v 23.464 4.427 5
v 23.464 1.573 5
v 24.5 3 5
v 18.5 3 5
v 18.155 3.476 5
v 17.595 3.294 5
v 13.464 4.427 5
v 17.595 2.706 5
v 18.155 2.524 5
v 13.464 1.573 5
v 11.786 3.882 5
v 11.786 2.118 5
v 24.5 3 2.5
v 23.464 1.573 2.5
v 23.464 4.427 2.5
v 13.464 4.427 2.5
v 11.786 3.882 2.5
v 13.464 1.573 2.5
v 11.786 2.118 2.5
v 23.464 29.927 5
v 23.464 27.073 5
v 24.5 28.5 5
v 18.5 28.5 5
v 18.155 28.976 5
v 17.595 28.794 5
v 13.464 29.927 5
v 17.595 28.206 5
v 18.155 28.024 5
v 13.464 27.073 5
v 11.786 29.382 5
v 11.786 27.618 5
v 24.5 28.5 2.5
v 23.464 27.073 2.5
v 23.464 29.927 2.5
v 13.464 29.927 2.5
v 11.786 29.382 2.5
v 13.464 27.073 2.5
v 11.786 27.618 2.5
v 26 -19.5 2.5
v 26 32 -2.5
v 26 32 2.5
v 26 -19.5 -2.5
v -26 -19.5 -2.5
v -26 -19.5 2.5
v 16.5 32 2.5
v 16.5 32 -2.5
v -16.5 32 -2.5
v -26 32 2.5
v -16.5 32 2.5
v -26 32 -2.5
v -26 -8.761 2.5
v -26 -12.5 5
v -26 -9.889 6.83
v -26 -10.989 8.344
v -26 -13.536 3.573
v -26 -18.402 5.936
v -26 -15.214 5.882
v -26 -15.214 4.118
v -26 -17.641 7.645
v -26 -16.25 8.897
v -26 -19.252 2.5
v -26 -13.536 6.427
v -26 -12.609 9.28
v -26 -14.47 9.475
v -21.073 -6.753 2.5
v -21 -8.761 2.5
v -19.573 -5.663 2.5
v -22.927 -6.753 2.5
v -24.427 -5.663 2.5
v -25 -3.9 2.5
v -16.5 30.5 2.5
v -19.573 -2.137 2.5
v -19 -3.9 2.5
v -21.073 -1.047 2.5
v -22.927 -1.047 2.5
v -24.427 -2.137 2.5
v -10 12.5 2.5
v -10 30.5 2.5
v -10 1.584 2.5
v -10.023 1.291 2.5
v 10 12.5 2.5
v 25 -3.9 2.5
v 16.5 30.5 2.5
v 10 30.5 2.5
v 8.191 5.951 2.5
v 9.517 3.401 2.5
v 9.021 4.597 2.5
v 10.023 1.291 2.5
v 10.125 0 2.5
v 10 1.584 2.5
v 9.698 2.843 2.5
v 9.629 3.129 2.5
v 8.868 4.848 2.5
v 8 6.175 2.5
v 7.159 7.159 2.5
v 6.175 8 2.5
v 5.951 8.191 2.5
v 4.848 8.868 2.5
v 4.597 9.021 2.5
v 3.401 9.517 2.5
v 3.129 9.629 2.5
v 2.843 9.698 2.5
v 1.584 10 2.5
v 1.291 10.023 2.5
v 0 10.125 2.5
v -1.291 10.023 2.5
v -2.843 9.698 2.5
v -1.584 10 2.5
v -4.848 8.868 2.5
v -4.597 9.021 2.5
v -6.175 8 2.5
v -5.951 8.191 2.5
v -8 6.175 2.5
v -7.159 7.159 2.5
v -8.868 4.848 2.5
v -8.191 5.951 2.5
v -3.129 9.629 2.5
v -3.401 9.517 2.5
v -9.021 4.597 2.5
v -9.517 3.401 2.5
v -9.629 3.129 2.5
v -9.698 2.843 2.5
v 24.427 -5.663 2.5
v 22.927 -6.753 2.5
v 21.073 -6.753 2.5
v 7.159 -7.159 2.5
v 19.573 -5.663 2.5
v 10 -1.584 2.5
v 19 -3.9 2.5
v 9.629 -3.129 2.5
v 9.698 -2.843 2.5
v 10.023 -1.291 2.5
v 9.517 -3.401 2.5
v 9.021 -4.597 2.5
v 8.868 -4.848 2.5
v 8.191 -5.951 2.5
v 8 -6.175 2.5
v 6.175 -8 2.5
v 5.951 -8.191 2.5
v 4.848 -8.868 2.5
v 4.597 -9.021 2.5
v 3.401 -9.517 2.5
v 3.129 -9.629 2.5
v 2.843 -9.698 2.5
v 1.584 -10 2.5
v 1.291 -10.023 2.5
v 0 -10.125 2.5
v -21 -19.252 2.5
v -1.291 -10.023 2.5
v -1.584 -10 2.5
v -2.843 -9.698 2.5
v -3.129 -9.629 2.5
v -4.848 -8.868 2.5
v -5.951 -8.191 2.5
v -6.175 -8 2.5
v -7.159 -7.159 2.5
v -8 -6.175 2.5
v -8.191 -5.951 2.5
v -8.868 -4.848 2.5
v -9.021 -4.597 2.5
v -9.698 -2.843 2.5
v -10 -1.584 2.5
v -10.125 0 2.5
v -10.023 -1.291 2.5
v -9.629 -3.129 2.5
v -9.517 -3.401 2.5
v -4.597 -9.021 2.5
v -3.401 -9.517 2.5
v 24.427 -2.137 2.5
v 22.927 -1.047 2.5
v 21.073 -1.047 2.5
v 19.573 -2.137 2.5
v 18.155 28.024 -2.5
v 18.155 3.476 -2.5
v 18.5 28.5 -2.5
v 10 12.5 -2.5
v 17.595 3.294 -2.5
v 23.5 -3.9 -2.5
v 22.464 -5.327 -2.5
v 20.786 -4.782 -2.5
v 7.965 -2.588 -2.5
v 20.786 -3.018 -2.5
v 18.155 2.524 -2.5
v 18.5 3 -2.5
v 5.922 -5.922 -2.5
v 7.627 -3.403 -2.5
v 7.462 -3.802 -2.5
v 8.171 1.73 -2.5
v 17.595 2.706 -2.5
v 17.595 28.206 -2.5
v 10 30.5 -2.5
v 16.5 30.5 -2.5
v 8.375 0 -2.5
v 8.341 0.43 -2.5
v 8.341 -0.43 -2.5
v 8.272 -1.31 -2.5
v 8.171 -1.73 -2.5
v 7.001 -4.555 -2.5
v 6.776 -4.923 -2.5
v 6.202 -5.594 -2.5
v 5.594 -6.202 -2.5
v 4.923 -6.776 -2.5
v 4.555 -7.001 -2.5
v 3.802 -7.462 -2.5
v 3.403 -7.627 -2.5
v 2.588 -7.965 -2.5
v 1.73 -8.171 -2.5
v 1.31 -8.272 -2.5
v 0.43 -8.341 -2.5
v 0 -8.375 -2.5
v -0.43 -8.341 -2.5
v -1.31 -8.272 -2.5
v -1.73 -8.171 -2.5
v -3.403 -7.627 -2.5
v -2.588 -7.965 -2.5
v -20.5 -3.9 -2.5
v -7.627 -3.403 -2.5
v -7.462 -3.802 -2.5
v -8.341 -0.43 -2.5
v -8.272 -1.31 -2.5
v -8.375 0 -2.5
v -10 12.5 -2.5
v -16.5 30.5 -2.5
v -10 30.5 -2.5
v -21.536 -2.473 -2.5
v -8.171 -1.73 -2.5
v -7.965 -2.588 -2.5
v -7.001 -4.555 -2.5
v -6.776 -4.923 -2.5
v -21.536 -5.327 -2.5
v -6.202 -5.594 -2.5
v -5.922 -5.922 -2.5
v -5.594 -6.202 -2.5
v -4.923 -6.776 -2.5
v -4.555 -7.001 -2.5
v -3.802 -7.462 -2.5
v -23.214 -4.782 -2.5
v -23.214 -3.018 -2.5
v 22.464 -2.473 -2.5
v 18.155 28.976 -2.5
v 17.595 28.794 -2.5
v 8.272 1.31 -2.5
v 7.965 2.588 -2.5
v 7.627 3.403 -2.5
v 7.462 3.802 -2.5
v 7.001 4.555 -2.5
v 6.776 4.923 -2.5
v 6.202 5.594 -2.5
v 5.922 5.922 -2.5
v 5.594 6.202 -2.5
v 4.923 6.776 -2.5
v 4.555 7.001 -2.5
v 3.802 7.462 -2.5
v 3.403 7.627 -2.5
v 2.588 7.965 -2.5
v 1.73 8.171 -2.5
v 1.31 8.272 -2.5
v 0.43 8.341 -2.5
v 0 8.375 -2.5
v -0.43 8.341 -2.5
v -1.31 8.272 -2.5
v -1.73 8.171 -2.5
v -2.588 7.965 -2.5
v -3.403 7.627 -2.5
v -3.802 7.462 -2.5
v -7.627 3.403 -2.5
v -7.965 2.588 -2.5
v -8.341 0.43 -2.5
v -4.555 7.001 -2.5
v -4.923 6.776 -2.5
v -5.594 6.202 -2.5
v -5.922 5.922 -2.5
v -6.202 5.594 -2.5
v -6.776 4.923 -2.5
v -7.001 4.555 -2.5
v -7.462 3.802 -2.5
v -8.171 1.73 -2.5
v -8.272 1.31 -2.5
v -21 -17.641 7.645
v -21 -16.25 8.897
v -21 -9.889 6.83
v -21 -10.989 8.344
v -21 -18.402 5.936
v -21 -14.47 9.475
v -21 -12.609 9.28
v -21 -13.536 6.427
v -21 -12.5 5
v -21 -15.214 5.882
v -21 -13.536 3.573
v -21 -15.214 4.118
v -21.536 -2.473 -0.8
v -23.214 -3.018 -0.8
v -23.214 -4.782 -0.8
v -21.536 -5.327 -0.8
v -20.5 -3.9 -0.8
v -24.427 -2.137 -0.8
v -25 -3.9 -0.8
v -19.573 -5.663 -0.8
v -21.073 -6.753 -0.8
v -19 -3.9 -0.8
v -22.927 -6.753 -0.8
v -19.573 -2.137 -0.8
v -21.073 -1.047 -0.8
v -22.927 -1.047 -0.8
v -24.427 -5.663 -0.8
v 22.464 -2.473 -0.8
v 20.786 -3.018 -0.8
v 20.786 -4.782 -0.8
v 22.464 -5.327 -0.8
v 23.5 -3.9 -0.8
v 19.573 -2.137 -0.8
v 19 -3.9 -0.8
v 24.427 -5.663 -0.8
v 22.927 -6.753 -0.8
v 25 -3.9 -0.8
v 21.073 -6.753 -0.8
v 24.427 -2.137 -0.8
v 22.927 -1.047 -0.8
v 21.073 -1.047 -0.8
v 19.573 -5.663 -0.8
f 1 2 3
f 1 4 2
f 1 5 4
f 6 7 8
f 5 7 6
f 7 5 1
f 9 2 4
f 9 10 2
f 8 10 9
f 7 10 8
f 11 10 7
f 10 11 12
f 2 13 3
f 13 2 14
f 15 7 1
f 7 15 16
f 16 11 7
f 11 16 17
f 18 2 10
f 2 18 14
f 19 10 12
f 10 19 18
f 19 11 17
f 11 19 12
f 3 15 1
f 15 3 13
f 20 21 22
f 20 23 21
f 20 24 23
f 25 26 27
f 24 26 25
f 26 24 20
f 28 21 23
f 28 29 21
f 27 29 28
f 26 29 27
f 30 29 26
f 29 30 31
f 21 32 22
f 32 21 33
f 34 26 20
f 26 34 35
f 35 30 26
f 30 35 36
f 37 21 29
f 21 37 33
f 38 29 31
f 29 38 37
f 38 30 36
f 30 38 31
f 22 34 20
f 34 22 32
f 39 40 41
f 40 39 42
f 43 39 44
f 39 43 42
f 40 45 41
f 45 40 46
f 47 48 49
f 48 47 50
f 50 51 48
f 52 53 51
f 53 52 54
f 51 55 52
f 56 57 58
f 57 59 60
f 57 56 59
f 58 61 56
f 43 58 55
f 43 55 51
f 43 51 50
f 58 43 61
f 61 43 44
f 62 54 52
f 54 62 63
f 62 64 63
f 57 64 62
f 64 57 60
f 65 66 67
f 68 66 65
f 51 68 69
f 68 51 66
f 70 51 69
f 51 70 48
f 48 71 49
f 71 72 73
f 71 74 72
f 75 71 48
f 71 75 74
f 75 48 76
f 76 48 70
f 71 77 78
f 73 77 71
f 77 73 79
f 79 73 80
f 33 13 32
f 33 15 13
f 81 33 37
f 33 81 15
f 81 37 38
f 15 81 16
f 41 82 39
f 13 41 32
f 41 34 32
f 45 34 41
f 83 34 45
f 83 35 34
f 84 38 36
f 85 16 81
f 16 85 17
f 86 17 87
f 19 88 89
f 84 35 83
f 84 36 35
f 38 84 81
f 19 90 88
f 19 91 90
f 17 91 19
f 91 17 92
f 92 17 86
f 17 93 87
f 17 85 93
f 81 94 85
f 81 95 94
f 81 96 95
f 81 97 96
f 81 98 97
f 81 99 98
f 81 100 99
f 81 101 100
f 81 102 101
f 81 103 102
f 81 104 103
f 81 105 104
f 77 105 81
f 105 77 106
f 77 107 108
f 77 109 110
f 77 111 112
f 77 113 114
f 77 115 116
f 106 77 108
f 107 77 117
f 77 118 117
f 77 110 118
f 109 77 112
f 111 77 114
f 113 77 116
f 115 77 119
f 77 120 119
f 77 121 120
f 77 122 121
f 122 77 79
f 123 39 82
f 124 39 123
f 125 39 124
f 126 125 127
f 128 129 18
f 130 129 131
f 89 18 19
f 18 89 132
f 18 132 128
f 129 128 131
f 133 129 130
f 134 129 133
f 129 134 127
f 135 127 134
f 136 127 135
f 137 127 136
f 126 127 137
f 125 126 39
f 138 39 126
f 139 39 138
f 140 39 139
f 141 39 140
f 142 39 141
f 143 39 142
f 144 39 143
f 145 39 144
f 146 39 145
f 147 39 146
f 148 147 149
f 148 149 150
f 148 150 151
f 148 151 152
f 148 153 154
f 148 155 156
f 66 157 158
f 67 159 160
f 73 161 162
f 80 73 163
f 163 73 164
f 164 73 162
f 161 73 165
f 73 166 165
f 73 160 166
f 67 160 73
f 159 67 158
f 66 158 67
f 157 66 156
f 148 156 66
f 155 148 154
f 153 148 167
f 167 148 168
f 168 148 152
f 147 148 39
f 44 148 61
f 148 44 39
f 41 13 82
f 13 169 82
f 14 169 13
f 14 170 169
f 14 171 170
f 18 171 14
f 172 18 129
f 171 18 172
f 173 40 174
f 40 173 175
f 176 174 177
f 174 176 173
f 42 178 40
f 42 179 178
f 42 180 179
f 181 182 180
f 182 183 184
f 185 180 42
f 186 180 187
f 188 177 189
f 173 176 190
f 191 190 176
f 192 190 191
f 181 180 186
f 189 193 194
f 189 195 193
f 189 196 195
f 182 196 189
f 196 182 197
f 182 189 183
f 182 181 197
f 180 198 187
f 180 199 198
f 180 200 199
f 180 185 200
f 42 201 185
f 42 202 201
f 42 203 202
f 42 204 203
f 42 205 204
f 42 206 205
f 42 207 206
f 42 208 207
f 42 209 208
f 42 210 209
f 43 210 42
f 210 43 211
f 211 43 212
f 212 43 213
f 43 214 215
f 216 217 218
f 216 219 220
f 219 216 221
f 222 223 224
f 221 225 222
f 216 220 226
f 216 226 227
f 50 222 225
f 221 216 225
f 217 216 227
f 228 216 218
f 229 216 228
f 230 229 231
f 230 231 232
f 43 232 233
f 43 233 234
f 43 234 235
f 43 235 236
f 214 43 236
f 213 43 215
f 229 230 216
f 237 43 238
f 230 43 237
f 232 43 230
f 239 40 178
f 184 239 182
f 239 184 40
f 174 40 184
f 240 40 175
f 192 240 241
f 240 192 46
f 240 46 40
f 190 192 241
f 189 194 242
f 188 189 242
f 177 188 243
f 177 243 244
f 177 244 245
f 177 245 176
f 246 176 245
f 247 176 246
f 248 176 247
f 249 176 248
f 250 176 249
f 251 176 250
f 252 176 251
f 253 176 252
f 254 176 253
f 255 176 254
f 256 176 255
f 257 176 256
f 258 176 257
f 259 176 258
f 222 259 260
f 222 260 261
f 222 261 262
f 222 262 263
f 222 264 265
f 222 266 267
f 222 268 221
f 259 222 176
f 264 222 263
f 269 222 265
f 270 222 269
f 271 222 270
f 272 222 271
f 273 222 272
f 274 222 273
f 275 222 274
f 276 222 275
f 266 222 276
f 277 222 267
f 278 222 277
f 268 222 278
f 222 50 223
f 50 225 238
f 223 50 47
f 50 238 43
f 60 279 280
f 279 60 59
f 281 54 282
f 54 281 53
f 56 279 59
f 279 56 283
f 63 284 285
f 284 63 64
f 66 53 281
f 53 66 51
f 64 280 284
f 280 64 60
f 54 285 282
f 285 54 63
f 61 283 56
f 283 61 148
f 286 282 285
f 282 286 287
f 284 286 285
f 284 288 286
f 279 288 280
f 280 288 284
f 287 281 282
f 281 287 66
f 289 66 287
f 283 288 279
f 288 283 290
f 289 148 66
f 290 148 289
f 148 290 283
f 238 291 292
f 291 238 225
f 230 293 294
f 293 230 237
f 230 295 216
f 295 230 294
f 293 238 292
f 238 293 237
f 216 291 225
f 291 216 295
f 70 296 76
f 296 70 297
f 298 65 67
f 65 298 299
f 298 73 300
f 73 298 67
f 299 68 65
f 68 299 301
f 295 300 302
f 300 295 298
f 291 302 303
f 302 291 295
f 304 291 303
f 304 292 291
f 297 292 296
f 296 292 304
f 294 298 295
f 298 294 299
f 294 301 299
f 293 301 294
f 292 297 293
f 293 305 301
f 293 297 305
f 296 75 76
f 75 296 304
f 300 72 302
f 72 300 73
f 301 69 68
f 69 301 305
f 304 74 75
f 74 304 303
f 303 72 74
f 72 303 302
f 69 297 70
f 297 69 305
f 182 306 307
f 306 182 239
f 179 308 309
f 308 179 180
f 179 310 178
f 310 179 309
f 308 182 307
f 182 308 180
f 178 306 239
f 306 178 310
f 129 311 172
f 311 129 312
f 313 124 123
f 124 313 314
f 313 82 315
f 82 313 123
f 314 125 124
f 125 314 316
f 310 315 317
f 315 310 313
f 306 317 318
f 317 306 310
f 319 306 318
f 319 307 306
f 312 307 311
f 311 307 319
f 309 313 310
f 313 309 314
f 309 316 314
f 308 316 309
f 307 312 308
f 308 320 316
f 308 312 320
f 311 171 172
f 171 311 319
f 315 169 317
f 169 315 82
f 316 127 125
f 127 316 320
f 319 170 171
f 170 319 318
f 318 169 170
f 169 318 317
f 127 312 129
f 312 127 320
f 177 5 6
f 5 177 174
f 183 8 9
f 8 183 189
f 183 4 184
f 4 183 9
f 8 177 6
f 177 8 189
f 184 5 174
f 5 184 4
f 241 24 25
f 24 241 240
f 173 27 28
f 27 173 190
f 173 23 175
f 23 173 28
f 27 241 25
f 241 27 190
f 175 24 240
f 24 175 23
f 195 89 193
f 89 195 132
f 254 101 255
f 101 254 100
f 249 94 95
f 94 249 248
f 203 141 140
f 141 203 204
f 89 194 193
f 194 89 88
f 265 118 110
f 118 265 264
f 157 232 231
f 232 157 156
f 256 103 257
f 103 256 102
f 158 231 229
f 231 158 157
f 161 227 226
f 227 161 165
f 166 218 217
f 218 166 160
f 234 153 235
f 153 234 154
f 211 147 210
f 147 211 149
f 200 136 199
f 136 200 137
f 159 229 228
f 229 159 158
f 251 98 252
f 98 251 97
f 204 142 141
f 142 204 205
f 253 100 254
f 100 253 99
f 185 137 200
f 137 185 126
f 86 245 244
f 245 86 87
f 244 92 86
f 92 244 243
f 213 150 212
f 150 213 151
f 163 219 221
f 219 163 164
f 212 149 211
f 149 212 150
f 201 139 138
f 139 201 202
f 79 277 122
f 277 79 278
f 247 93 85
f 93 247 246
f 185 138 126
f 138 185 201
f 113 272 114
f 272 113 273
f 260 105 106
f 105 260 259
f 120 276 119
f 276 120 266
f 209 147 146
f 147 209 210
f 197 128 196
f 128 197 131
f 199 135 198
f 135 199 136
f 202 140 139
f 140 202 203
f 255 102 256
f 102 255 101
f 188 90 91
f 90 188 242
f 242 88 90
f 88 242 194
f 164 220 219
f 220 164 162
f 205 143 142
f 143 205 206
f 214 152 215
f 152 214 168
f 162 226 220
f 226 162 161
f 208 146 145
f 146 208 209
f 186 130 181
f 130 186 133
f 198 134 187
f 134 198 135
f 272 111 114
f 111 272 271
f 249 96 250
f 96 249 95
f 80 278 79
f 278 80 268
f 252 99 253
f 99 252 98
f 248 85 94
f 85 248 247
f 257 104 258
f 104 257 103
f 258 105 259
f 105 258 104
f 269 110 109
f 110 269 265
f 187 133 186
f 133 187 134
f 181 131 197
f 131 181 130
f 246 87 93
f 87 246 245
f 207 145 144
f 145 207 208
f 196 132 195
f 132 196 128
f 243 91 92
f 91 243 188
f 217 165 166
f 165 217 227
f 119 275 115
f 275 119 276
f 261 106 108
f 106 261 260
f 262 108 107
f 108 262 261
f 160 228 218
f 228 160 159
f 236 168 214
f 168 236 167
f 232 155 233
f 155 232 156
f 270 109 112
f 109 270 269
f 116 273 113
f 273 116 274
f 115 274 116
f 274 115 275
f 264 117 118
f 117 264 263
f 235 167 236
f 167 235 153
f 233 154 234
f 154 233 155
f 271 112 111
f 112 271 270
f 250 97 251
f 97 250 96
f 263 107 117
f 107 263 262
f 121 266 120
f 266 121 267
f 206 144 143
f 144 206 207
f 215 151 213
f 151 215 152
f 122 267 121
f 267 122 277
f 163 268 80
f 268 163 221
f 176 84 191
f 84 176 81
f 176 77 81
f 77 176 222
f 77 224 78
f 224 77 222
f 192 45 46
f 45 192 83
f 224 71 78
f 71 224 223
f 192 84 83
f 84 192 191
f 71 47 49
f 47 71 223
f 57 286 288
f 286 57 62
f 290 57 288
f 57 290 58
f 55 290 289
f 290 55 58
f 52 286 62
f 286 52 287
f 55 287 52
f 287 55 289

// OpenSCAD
module hotend_platform()
{
    difference() {
        union() {
            translate([0,0,-6.25]) cube([52,5,51.5], center=true);
            rotate([90,0,0]) {
                for (j=[0,1]) hull() for (i=[0,1]) {
                    translate([(i*10)+13,-((j*25.5)+3),-3.5]) cylinder(d=3, h=3, center=true);
                }
            }
            rotate([0,90,0]) {
                translate([-14,1,-23.5]) hull() {
                    cube([11,1,5], center=true);
                    translate([0,4,0]) cylinder(d=9, h=5, center=true);
                }
            }
        }
        translate([0,0,-23]) cube([20,6,21], center=true);
        translate([0,0,-33]) cube([33,6,5], center=true);
        rotate([90,0,0]) {
            cylinder(d1=22, d2=15, h=10, center=true, $fn=40);
            for(i=[-1,1]) translate([i*22,3.9,0]) {
                cylinder(d=3, h=10, center=true);
                translate([0,0,-5+3.3]) cylinder(d=6, h=5, center=true);
            }
            # for (i=[0,1]) translate([18,-((i*25.5)+3),0]) cylinder(d=1, h=12, center=true);
        }
        rotate([0,90,0]) translate([-14,5,-24.5]) cylinder(d=3, h=10, center=true);
    }
}

module hotend_stand()
{
    difference() {
        hull() {
            translate([0,1,0]) hull() {
                cube([6,1,5], center=true);
                translate([0,4+40,0]) cylinder(d=9, h=5, center=true);
            }
            hull() {
                translate([0-24,1,0]) cube([6,1,5], center=true);
                translate([0,1+4+40,0]) cylinder(d=6, h=5, center=true);
            }
        }
        translate([0,5+40,0]) cylinder(d=3, h=10, center=true, $fn=8);
    }
}

rotate([90,0,0]) {
    // % translate([0,-10.2,-39]) {
    //     import("../distribution/bowden_carriage.stl", convexity=3);
    //     translate([0,1.5,45.2]) rotate([180,0,0]) import("../distribution/bowden_carriage_clamp.stl", convexity=3);
    //     translate([0,-13.4,39]) rotate([-90,180,0]) import("../inc/e3d_v6_hotend.stl", convexity=3);
    // }
    hotend_platform();
}
// hotend_stand();
